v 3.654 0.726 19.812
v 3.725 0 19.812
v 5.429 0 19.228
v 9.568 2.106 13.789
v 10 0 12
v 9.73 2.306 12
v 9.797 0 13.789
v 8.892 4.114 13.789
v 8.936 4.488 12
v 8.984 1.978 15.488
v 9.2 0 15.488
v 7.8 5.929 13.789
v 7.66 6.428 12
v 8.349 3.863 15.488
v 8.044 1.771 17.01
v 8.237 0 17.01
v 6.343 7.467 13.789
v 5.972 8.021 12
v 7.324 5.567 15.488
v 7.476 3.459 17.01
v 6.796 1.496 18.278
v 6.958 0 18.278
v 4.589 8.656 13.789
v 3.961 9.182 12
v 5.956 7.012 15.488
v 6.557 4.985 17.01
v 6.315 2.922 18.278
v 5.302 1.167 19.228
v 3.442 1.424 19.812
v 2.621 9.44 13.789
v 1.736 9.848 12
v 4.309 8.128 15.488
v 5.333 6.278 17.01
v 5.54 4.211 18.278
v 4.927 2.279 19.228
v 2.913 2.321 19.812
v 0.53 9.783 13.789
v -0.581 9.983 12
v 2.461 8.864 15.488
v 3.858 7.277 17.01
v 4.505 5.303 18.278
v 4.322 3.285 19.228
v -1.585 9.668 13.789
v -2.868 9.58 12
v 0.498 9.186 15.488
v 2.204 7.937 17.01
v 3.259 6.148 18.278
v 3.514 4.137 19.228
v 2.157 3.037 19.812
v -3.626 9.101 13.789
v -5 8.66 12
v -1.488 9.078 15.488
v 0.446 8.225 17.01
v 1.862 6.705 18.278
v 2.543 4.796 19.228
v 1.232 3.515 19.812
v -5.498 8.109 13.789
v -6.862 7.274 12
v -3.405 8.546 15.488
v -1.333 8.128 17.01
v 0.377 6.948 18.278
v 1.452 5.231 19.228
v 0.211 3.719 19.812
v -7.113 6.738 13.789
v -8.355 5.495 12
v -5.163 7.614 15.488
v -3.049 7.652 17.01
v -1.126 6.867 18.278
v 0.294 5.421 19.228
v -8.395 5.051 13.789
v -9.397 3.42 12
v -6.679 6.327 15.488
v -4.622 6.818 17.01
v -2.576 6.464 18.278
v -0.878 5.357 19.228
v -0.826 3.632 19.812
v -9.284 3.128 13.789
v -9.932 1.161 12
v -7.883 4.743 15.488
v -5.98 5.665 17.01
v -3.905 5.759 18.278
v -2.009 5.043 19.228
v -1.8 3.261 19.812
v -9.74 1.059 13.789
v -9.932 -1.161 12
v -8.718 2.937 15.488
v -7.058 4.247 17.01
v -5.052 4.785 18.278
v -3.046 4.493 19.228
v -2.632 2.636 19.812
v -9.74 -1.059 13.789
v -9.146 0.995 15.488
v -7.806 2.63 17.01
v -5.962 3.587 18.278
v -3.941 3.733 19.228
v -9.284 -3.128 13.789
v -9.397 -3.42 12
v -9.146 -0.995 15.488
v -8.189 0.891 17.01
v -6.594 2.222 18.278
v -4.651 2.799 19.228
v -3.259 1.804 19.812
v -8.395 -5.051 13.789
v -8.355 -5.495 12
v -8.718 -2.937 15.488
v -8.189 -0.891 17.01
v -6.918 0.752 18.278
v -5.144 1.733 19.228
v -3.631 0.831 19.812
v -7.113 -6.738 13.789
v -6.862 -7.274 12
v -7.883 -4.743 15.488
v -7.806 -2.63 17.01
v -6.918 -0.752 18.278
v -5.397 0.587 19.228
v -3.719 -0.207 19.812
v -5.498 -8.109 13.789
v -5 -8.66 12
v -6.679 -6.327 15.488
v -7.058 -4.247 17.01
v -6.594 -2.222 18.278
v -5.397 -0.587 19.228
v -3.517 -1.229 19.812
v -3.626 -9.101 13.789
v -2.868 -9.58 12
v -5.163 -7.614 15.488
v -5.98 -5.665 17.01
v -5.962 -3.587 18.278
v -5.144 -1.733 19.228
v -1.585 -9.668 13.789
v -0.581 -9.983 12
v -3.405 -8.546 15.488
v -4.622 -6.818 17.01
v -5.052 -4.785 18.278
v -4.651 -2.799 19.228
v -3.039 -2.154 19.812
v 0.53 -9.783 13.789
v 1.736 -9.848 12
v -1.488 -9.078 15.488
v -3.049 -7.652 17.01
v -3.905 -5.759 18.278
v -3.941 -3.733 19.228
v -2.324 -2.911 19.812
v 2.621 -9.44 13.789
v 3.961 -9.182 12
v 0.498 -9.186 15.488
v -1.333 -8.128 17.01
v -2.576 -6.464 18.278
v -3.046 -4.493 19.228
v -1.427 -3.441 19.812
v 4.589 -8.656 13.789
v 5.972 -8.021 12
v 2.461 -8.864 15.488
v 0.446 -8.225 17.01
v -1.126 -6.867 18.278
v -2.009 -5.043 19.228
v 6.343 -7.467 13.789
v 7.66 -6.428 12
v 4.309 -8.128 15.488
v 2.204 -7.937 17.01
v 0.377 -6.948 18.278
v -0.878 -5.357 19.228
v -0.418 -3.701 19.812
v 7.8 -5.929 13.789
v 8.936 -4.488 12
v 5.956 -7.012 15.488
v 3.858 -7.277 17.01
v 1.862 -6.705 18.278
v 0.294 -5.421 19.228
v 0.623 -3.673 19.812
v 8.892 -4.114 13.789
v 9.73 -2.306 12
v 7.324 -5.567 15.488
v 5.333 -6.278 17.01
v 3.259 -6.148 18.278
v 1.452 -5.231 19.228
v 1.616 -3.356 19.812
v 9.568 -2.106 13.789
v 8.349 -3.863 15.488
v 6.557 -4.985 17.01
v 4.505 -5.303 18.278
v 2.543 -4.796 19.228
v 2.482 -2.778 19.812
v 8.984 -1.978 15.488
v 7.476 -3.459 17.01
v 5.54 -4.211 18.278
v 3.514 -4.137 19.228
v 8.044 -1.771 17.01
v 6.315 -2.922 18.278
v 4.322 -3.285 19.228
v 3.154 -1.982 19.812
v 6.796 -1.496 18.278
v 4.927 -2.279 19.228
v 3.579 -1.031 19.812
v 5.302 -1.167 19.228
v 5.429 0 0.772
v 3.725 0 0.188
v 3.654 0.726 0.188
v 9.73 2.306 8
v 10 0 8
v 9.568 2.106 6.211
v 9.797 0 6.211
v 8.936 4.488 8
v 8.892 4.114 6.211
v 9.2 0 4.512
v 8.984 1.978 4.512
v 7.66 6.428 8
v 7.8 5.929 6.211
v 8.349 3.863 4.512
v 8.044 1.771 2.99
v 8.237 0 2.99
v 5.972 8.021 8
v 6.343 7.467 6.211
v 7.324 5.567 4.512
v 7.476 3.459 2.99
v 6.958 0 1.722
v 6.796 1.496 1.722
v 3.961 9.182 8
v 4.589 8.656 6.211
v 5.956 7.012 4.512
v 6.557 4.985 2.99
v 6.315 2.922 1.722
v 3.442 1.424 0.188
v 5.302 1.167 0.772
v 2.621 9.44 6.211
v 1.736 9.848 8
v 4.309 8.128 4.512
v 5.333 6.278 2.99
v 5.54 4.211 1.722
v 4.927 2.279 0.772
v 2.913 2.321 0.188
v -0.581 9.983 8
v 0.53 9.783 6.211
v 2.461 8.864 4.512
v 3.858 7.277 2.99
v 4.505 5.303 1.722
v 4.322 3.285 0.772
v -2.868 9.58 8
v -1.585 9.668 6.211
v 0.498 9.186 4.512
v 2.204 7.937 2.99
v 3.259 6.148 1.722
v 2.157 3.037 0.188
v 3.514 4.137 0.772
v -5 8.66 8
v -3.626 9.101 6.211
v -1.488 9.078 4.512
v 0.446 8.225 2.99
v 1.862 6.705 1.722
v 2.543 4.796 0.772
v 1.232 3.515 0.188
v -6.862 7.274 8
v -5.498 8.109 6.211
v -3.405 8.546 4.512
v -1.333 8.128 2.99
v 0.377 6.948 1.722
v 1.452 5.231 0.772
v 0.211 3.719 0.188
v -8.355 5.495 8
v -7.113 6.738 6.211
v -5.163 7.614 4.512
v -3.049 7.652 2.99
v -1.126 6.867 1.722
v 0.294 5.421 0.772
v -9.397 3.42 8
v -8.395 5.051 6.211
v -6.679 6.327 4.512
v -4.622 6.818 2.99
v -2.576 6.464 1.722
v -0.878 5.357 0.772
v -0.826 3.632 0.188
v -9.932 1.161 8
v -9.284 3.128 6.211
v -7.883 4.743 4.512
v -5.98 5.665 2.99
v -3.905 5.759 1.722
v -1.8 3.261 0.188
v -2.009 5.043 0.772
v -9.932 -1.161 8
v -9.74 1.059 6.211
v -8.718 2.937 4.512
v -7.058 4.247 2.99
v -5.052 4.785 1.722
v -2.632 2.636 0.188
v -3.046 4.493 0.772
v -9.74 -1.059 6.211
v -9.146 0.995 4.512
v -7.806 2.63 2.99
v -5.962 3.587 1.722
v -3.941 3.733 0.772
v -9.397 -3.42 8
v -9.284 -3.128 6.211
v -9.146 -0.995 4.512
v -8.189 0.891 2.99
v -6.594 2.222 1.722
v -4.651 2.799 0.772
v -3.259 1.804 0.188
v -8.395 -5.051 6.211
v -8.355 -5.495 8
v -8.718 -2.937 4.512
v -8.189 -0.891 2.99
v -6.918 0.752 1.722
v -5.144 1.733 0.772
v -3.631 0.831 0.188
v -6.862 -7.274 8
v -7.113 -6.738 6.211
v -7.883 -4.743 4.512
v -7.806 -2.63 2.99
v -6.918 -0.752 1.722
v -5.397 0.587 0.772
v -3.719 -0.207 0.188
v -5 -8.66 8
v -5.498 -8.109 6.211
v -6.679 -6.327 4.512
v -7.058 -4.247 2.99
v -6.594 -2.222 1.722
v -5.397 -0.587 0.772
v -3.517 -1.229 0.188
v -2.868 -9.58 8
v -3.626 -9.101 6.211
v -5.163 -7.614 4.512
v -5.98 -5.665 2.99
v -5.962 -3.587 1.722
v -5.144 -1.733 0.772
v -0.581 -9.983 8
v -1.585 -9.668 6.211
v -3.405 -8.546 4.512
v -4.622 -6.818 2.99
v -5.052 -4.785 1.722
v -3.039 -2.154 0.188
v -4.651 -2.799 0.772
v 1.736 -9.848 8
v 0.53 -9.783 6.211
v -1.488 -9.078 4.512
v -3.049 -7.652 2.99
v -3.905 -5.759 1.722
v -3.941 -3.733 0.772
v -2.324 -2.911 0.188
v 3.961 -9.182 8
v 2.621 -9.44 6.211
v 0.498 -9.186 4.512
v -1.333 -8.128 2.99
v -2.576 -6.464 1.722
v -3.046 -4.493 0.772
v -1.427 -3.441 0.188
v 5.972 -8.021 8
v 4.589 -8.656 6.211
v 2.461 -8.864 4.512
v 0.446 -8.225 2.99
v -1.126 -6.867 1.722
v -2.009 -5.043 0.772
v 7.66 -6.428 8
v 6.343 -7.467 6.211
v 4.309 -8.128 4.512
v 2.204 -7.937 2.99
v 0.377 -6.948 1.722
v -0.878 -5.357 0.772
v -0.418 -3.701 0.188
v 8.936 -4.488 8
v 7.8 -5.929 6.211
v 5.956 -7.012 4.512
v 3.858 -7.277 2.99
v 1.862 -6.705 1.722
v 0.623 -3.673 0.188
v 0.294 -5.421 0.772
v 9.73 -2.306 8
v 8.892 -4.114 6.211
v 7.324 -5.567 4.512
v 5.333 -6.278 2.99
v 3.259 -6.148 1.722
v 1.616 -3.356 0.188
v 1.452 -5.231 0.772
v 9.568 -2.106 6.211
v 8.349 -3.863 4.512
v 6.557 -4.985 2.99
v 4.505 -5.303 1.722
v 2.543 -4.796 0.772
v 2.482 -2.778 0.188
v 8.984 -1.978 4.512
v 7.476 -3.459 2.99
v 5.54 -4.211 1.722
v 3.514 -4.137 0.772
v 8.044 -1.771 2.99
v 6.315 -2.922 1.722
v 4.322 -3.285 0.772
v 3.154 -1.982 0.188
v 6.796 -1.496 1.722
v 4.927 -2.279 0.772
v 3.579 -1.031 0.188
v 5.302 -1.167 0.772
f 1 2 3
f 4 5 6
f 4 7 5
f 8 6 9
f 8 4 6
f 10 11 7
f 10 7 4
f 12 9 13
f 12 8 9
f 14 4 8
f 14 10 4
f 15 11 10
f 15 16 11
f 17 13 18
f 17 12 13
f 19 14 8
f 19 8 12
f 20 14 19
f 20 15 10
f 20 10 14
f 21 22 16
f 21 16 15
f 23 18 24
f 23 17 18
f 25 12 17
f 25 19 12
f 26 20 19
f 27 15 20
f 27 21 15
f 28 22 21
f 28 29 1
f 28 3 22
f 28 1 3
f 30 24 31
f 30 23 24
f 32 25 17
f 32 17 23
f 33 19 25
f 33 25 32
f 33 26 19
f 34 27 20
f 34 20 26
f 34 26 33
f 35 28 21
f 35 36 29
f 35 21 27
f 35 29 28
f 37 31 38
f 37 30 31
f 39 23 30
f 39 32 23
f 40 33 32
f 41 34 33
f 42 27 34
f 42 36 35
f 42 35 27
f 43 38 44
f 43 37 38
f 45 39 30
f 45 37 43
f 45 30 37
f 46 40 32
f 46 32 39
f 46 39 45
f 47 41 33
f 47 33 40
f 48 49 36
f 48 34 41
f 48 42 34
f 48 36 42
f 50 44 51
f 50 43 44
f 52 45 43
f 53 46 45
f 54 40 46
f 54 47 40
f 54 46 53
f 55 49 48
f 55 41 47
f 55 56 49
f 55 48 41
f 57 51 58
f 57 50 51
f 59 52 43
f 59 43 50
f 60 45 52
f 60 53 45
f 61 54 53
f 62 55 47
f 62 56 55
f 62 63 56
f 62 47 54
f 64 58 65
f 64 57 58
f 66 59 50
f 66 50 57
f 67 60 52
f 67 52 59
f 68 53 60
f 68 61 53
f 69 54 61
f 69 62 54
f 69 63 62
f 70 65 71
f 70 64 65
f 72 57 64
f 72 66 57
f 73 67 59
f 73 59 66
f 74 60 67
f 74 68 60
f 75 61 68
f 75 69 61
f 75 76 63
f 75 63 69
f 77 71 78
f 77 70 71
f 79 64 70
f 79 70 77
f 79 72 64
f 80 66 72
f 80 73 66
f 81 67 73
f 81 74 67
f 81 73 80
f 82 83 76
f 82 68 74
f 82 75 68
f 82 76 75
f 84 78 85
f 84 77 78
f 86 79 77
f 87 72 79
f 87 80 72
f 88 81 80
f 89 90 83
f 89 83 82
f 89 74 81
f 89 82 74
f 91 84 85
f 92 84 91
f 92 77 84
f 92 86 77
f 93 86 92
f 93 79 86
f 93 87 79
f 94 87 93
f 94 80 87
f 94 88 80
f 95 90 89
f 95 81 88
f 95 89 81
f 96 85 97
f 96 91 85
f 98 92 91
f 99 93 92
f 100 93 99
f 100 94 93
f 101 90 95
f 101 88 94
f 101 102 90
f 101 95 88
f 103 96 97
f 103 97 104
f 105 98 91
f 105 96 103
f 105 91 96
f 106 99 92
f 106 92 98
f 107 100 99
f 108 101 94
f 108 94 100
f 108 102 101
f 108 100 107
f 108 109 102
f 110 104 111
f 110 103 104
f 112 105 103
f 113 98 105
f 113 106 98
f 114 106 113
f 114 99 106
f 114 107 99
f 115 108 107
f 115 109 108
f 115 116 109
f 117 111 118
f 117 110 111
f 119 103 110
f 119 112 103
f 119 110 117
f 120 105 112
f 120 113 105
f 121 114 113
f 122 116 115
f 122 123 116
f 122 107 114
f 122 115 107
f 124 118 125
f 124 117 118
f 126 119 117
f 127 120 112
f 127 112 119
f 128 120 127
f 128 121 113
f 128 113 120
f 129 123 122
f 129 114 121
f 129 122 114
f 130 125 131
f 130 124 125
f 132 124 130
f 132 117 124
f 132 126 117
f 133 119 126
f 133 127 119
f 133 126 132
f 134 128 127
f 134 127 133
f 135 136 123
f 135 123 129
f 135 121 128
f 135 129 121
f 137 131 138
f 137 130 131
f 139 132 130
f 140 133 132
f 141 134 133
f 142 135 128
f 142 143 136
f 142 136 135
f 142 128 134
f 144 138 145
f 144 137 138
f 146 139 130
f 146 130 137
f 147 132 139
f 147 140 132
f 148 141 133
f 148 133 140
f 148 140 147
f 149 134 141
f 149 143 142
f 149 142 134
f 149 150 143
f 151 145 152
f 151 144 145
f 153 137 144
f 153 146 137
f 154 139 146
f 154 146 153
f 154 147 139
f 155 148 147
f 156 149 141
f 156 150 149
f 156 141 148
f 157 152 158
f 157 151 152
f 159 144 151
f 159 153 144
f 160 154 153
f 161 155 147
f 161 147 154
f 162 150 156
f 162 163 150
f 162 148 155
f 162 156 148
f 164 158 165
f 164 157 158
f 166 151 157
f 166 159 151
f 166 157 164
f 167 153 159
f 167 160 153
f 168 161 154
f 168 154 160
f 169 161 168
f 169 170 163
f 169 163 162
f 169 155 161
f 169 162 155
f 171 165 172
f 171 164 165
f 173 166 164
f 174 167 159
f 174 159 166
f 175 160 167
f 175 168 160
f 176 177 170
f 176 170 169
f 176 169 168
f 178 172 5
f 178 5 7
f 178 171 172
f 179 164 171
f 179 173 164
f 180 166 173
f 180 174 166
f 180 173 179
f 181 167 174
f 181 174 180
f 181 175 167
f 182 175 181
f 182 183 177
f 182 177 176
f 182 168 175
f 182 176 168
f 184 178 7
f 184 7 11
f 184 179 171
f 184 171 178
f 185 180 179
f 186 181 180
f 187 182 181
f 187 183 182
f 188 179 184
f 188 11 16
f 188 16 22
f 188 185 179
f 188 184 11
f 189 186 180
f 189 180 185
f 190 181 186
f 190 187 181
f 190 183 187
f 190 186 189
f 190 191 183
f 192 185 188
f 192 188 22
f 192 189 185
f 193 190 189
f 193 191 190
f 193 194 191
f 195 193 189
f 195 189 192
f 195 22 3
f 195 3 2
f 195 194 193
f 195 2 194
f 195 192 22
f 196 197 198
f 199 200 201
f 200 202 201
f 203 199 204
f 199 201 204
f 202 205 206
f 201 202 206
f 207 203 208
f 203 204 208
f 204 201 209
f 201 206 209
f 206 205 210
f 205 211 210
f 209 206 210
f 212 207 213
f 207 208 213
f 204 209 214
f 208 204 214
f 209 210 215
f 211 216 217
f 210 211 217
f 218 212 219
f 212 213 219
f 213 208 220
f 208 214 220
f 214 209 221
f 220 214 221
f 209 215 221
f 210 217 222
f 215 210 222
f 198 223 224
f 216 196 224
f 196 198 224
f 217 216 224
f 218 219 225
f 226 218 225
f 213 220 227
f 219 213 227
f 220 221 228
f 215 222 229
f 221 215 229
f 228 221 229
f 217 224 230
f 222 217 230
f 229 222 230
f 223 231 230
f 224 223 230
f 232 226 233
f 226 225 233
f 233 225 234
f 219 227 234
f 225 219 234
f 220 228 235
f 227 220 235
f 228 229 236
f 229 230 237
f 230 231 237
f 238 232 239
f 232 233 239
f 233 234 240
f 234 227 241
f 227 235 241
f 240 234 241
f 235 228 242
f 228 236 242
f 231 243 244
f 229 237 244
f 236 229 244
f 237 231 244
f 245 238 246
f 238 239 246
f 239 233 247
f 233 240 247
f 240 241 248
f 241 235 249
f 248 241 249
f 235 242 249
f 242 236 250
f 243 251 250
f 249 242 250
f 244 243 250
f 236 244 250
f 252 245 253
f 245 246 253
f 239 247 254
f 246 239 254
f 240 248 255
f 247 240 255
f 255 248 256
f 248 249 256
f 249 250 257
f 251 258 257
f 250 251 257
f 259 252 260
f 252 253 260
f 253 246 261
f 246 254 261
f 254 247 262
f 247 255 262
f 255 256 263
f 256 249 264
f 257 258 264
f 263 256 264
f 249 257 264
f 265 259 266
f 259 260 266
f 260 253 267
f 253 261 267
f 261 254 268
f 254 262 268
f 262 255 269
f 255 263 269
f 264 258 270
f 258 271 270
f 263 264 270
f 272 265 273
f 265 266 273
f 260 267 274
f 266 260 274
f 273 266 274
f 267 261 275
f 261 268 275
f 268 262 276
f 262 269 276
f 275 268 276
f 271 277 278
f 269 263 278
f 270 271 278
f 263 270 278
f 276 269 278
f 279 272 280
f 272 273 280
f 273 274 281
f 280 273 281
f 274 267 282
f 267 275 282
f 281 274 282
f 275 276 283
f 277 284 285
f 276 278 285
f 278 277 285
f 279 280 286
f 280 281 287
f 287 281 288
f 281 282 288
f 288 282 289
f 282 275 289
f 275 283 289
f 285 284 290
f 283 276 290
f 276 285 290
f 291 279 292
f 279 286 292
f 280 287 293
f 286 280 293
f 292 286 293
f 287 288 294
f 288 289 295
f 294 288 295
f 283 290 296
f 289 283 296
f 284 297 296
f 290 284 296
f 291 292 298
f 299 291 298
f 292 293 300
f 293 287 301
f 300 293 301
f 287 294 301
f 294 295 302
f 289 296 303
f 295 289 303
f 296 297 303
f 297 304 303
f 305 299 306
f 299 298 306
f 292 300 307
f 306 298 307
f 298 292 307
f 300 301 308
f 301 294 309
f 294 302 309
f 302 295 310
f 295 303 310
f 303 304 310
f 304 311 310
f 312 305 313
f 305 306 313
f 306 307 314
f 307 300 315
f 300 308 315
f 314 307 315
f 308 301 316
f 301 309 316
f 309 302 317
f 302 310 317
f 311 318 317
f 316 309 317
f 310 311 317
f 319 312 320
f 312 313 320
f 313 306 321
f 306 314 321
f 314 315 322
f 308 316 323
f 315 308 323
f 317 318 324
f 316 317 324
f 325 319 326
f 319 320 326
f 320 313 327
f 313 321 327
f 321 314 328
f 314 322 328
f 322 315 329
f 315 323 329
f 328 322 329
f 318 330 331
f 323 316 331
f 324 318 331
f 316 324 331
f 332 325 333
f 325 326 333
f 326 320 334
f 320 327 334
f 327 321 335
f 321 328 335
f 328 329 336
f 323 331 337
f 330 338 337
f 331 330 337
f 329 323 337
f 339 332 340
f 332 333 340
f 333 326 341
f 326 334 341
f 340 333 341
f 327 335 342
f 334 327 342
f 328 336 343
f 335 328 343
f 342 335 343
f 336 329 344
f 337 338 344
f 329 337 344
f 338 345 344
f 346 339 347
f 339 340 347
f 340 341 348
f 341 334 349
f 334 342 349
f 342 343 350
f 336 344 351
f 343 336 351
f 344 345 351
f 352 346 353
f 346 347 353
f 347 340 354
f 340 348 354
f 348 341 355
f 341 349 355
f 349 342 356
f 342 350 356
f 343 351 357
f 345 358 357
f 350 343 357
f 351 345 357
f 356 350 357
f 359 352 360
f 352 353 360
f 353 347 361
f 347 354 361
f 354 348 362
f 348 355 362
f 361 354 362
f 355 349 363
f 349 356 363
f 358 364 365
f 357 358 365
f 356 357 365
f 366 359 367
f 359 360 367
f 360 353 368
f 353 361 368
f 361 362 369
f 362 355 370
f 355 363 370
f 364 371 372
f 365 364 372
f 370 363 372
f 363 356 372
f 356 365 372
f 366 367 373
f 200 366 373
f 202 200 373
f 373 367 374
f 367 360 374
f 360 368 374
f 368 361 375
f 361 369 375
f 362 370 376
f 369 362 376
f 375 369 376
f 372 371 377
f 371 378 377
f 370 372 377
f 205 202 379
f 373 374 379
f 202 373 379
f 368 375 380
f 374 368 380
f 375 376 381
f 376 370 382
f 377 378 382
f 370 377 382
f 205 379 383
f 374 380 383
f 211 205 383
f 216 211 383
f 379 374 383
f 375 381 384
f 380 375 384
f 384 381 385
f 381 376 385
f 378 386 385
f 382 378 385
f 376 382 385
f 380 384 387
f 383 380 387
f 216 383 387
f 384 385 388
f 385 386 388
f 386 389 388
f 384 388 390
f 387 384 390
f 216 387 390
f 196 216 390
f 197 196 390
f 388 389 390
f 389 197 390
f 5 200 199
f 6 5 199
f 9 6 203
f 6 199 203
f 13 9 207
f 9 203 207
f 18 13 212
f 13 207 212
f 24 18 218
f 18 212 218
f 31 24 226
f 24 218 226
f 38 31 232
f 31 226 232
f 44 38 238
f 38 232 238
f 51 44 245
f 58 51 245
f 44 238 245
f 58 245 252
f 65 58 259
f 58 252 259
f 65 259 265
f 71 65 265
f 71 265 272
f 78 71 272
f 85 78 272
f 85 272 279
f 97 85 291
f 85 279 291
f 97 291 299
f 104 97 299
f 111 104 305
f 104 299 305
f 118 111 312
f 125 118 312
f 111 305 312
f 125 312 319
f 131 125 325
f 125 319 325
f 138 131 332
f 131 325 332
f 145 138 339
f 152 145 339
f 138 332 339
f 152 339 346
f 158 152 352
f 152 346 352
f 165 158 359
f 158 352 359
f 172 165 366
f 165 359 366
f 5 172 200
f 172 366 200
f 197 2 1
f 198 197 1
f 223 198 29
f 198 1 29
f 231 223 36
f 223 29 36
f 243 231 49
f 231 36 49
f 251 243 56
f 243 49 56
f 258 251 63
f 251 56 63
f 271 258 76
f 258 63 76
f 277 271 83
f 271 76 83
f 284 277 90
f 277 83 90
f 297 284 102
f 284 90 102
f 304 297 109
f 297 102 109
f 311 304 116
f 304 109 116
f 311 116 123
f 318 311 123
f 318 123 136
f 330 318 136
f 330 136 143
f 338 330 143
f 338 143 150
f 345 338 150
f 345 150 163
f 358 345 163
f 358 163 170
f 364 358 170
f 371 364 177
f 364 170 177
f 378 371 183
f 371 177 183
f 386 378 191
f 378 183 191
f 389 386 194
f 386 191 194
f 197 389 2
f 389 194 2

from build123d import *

# Parameters (mm, degrees)
F0_R     = 10
F1_DEPTH = 20
F2_R     = 8
F3_R     = 3.725
F3_R_2   = 2
F4_DEPTH = 20.1


with BuildPart() as f1:
    # F0 (on Top) → F1 (new body)
    with BuildSketch(Plane.XY):
        Circle(F0_R)
    extrude(amount=F1_DEPTH)

    # F2
    f2_edges = [f1.edges().sort_by_distance(p)[0] for p in [
        (-10, 0, 20),
        (-10, 0, 0),
    ]]
    fillet(f2_edges, radius=F2_R)

    # F3 (on face) → F4 (cut)
    with BuildSketch(Plane.XY.offset(20)):
        Circle(F3_R)
        Circle(F3_R_2, mode=Mode.SUBTRACT)
        Circle(F3_R_2)
    extrude(amount=-F4_DEPTH, mode=Mode.SUBTRACT)


solid = f1.part
